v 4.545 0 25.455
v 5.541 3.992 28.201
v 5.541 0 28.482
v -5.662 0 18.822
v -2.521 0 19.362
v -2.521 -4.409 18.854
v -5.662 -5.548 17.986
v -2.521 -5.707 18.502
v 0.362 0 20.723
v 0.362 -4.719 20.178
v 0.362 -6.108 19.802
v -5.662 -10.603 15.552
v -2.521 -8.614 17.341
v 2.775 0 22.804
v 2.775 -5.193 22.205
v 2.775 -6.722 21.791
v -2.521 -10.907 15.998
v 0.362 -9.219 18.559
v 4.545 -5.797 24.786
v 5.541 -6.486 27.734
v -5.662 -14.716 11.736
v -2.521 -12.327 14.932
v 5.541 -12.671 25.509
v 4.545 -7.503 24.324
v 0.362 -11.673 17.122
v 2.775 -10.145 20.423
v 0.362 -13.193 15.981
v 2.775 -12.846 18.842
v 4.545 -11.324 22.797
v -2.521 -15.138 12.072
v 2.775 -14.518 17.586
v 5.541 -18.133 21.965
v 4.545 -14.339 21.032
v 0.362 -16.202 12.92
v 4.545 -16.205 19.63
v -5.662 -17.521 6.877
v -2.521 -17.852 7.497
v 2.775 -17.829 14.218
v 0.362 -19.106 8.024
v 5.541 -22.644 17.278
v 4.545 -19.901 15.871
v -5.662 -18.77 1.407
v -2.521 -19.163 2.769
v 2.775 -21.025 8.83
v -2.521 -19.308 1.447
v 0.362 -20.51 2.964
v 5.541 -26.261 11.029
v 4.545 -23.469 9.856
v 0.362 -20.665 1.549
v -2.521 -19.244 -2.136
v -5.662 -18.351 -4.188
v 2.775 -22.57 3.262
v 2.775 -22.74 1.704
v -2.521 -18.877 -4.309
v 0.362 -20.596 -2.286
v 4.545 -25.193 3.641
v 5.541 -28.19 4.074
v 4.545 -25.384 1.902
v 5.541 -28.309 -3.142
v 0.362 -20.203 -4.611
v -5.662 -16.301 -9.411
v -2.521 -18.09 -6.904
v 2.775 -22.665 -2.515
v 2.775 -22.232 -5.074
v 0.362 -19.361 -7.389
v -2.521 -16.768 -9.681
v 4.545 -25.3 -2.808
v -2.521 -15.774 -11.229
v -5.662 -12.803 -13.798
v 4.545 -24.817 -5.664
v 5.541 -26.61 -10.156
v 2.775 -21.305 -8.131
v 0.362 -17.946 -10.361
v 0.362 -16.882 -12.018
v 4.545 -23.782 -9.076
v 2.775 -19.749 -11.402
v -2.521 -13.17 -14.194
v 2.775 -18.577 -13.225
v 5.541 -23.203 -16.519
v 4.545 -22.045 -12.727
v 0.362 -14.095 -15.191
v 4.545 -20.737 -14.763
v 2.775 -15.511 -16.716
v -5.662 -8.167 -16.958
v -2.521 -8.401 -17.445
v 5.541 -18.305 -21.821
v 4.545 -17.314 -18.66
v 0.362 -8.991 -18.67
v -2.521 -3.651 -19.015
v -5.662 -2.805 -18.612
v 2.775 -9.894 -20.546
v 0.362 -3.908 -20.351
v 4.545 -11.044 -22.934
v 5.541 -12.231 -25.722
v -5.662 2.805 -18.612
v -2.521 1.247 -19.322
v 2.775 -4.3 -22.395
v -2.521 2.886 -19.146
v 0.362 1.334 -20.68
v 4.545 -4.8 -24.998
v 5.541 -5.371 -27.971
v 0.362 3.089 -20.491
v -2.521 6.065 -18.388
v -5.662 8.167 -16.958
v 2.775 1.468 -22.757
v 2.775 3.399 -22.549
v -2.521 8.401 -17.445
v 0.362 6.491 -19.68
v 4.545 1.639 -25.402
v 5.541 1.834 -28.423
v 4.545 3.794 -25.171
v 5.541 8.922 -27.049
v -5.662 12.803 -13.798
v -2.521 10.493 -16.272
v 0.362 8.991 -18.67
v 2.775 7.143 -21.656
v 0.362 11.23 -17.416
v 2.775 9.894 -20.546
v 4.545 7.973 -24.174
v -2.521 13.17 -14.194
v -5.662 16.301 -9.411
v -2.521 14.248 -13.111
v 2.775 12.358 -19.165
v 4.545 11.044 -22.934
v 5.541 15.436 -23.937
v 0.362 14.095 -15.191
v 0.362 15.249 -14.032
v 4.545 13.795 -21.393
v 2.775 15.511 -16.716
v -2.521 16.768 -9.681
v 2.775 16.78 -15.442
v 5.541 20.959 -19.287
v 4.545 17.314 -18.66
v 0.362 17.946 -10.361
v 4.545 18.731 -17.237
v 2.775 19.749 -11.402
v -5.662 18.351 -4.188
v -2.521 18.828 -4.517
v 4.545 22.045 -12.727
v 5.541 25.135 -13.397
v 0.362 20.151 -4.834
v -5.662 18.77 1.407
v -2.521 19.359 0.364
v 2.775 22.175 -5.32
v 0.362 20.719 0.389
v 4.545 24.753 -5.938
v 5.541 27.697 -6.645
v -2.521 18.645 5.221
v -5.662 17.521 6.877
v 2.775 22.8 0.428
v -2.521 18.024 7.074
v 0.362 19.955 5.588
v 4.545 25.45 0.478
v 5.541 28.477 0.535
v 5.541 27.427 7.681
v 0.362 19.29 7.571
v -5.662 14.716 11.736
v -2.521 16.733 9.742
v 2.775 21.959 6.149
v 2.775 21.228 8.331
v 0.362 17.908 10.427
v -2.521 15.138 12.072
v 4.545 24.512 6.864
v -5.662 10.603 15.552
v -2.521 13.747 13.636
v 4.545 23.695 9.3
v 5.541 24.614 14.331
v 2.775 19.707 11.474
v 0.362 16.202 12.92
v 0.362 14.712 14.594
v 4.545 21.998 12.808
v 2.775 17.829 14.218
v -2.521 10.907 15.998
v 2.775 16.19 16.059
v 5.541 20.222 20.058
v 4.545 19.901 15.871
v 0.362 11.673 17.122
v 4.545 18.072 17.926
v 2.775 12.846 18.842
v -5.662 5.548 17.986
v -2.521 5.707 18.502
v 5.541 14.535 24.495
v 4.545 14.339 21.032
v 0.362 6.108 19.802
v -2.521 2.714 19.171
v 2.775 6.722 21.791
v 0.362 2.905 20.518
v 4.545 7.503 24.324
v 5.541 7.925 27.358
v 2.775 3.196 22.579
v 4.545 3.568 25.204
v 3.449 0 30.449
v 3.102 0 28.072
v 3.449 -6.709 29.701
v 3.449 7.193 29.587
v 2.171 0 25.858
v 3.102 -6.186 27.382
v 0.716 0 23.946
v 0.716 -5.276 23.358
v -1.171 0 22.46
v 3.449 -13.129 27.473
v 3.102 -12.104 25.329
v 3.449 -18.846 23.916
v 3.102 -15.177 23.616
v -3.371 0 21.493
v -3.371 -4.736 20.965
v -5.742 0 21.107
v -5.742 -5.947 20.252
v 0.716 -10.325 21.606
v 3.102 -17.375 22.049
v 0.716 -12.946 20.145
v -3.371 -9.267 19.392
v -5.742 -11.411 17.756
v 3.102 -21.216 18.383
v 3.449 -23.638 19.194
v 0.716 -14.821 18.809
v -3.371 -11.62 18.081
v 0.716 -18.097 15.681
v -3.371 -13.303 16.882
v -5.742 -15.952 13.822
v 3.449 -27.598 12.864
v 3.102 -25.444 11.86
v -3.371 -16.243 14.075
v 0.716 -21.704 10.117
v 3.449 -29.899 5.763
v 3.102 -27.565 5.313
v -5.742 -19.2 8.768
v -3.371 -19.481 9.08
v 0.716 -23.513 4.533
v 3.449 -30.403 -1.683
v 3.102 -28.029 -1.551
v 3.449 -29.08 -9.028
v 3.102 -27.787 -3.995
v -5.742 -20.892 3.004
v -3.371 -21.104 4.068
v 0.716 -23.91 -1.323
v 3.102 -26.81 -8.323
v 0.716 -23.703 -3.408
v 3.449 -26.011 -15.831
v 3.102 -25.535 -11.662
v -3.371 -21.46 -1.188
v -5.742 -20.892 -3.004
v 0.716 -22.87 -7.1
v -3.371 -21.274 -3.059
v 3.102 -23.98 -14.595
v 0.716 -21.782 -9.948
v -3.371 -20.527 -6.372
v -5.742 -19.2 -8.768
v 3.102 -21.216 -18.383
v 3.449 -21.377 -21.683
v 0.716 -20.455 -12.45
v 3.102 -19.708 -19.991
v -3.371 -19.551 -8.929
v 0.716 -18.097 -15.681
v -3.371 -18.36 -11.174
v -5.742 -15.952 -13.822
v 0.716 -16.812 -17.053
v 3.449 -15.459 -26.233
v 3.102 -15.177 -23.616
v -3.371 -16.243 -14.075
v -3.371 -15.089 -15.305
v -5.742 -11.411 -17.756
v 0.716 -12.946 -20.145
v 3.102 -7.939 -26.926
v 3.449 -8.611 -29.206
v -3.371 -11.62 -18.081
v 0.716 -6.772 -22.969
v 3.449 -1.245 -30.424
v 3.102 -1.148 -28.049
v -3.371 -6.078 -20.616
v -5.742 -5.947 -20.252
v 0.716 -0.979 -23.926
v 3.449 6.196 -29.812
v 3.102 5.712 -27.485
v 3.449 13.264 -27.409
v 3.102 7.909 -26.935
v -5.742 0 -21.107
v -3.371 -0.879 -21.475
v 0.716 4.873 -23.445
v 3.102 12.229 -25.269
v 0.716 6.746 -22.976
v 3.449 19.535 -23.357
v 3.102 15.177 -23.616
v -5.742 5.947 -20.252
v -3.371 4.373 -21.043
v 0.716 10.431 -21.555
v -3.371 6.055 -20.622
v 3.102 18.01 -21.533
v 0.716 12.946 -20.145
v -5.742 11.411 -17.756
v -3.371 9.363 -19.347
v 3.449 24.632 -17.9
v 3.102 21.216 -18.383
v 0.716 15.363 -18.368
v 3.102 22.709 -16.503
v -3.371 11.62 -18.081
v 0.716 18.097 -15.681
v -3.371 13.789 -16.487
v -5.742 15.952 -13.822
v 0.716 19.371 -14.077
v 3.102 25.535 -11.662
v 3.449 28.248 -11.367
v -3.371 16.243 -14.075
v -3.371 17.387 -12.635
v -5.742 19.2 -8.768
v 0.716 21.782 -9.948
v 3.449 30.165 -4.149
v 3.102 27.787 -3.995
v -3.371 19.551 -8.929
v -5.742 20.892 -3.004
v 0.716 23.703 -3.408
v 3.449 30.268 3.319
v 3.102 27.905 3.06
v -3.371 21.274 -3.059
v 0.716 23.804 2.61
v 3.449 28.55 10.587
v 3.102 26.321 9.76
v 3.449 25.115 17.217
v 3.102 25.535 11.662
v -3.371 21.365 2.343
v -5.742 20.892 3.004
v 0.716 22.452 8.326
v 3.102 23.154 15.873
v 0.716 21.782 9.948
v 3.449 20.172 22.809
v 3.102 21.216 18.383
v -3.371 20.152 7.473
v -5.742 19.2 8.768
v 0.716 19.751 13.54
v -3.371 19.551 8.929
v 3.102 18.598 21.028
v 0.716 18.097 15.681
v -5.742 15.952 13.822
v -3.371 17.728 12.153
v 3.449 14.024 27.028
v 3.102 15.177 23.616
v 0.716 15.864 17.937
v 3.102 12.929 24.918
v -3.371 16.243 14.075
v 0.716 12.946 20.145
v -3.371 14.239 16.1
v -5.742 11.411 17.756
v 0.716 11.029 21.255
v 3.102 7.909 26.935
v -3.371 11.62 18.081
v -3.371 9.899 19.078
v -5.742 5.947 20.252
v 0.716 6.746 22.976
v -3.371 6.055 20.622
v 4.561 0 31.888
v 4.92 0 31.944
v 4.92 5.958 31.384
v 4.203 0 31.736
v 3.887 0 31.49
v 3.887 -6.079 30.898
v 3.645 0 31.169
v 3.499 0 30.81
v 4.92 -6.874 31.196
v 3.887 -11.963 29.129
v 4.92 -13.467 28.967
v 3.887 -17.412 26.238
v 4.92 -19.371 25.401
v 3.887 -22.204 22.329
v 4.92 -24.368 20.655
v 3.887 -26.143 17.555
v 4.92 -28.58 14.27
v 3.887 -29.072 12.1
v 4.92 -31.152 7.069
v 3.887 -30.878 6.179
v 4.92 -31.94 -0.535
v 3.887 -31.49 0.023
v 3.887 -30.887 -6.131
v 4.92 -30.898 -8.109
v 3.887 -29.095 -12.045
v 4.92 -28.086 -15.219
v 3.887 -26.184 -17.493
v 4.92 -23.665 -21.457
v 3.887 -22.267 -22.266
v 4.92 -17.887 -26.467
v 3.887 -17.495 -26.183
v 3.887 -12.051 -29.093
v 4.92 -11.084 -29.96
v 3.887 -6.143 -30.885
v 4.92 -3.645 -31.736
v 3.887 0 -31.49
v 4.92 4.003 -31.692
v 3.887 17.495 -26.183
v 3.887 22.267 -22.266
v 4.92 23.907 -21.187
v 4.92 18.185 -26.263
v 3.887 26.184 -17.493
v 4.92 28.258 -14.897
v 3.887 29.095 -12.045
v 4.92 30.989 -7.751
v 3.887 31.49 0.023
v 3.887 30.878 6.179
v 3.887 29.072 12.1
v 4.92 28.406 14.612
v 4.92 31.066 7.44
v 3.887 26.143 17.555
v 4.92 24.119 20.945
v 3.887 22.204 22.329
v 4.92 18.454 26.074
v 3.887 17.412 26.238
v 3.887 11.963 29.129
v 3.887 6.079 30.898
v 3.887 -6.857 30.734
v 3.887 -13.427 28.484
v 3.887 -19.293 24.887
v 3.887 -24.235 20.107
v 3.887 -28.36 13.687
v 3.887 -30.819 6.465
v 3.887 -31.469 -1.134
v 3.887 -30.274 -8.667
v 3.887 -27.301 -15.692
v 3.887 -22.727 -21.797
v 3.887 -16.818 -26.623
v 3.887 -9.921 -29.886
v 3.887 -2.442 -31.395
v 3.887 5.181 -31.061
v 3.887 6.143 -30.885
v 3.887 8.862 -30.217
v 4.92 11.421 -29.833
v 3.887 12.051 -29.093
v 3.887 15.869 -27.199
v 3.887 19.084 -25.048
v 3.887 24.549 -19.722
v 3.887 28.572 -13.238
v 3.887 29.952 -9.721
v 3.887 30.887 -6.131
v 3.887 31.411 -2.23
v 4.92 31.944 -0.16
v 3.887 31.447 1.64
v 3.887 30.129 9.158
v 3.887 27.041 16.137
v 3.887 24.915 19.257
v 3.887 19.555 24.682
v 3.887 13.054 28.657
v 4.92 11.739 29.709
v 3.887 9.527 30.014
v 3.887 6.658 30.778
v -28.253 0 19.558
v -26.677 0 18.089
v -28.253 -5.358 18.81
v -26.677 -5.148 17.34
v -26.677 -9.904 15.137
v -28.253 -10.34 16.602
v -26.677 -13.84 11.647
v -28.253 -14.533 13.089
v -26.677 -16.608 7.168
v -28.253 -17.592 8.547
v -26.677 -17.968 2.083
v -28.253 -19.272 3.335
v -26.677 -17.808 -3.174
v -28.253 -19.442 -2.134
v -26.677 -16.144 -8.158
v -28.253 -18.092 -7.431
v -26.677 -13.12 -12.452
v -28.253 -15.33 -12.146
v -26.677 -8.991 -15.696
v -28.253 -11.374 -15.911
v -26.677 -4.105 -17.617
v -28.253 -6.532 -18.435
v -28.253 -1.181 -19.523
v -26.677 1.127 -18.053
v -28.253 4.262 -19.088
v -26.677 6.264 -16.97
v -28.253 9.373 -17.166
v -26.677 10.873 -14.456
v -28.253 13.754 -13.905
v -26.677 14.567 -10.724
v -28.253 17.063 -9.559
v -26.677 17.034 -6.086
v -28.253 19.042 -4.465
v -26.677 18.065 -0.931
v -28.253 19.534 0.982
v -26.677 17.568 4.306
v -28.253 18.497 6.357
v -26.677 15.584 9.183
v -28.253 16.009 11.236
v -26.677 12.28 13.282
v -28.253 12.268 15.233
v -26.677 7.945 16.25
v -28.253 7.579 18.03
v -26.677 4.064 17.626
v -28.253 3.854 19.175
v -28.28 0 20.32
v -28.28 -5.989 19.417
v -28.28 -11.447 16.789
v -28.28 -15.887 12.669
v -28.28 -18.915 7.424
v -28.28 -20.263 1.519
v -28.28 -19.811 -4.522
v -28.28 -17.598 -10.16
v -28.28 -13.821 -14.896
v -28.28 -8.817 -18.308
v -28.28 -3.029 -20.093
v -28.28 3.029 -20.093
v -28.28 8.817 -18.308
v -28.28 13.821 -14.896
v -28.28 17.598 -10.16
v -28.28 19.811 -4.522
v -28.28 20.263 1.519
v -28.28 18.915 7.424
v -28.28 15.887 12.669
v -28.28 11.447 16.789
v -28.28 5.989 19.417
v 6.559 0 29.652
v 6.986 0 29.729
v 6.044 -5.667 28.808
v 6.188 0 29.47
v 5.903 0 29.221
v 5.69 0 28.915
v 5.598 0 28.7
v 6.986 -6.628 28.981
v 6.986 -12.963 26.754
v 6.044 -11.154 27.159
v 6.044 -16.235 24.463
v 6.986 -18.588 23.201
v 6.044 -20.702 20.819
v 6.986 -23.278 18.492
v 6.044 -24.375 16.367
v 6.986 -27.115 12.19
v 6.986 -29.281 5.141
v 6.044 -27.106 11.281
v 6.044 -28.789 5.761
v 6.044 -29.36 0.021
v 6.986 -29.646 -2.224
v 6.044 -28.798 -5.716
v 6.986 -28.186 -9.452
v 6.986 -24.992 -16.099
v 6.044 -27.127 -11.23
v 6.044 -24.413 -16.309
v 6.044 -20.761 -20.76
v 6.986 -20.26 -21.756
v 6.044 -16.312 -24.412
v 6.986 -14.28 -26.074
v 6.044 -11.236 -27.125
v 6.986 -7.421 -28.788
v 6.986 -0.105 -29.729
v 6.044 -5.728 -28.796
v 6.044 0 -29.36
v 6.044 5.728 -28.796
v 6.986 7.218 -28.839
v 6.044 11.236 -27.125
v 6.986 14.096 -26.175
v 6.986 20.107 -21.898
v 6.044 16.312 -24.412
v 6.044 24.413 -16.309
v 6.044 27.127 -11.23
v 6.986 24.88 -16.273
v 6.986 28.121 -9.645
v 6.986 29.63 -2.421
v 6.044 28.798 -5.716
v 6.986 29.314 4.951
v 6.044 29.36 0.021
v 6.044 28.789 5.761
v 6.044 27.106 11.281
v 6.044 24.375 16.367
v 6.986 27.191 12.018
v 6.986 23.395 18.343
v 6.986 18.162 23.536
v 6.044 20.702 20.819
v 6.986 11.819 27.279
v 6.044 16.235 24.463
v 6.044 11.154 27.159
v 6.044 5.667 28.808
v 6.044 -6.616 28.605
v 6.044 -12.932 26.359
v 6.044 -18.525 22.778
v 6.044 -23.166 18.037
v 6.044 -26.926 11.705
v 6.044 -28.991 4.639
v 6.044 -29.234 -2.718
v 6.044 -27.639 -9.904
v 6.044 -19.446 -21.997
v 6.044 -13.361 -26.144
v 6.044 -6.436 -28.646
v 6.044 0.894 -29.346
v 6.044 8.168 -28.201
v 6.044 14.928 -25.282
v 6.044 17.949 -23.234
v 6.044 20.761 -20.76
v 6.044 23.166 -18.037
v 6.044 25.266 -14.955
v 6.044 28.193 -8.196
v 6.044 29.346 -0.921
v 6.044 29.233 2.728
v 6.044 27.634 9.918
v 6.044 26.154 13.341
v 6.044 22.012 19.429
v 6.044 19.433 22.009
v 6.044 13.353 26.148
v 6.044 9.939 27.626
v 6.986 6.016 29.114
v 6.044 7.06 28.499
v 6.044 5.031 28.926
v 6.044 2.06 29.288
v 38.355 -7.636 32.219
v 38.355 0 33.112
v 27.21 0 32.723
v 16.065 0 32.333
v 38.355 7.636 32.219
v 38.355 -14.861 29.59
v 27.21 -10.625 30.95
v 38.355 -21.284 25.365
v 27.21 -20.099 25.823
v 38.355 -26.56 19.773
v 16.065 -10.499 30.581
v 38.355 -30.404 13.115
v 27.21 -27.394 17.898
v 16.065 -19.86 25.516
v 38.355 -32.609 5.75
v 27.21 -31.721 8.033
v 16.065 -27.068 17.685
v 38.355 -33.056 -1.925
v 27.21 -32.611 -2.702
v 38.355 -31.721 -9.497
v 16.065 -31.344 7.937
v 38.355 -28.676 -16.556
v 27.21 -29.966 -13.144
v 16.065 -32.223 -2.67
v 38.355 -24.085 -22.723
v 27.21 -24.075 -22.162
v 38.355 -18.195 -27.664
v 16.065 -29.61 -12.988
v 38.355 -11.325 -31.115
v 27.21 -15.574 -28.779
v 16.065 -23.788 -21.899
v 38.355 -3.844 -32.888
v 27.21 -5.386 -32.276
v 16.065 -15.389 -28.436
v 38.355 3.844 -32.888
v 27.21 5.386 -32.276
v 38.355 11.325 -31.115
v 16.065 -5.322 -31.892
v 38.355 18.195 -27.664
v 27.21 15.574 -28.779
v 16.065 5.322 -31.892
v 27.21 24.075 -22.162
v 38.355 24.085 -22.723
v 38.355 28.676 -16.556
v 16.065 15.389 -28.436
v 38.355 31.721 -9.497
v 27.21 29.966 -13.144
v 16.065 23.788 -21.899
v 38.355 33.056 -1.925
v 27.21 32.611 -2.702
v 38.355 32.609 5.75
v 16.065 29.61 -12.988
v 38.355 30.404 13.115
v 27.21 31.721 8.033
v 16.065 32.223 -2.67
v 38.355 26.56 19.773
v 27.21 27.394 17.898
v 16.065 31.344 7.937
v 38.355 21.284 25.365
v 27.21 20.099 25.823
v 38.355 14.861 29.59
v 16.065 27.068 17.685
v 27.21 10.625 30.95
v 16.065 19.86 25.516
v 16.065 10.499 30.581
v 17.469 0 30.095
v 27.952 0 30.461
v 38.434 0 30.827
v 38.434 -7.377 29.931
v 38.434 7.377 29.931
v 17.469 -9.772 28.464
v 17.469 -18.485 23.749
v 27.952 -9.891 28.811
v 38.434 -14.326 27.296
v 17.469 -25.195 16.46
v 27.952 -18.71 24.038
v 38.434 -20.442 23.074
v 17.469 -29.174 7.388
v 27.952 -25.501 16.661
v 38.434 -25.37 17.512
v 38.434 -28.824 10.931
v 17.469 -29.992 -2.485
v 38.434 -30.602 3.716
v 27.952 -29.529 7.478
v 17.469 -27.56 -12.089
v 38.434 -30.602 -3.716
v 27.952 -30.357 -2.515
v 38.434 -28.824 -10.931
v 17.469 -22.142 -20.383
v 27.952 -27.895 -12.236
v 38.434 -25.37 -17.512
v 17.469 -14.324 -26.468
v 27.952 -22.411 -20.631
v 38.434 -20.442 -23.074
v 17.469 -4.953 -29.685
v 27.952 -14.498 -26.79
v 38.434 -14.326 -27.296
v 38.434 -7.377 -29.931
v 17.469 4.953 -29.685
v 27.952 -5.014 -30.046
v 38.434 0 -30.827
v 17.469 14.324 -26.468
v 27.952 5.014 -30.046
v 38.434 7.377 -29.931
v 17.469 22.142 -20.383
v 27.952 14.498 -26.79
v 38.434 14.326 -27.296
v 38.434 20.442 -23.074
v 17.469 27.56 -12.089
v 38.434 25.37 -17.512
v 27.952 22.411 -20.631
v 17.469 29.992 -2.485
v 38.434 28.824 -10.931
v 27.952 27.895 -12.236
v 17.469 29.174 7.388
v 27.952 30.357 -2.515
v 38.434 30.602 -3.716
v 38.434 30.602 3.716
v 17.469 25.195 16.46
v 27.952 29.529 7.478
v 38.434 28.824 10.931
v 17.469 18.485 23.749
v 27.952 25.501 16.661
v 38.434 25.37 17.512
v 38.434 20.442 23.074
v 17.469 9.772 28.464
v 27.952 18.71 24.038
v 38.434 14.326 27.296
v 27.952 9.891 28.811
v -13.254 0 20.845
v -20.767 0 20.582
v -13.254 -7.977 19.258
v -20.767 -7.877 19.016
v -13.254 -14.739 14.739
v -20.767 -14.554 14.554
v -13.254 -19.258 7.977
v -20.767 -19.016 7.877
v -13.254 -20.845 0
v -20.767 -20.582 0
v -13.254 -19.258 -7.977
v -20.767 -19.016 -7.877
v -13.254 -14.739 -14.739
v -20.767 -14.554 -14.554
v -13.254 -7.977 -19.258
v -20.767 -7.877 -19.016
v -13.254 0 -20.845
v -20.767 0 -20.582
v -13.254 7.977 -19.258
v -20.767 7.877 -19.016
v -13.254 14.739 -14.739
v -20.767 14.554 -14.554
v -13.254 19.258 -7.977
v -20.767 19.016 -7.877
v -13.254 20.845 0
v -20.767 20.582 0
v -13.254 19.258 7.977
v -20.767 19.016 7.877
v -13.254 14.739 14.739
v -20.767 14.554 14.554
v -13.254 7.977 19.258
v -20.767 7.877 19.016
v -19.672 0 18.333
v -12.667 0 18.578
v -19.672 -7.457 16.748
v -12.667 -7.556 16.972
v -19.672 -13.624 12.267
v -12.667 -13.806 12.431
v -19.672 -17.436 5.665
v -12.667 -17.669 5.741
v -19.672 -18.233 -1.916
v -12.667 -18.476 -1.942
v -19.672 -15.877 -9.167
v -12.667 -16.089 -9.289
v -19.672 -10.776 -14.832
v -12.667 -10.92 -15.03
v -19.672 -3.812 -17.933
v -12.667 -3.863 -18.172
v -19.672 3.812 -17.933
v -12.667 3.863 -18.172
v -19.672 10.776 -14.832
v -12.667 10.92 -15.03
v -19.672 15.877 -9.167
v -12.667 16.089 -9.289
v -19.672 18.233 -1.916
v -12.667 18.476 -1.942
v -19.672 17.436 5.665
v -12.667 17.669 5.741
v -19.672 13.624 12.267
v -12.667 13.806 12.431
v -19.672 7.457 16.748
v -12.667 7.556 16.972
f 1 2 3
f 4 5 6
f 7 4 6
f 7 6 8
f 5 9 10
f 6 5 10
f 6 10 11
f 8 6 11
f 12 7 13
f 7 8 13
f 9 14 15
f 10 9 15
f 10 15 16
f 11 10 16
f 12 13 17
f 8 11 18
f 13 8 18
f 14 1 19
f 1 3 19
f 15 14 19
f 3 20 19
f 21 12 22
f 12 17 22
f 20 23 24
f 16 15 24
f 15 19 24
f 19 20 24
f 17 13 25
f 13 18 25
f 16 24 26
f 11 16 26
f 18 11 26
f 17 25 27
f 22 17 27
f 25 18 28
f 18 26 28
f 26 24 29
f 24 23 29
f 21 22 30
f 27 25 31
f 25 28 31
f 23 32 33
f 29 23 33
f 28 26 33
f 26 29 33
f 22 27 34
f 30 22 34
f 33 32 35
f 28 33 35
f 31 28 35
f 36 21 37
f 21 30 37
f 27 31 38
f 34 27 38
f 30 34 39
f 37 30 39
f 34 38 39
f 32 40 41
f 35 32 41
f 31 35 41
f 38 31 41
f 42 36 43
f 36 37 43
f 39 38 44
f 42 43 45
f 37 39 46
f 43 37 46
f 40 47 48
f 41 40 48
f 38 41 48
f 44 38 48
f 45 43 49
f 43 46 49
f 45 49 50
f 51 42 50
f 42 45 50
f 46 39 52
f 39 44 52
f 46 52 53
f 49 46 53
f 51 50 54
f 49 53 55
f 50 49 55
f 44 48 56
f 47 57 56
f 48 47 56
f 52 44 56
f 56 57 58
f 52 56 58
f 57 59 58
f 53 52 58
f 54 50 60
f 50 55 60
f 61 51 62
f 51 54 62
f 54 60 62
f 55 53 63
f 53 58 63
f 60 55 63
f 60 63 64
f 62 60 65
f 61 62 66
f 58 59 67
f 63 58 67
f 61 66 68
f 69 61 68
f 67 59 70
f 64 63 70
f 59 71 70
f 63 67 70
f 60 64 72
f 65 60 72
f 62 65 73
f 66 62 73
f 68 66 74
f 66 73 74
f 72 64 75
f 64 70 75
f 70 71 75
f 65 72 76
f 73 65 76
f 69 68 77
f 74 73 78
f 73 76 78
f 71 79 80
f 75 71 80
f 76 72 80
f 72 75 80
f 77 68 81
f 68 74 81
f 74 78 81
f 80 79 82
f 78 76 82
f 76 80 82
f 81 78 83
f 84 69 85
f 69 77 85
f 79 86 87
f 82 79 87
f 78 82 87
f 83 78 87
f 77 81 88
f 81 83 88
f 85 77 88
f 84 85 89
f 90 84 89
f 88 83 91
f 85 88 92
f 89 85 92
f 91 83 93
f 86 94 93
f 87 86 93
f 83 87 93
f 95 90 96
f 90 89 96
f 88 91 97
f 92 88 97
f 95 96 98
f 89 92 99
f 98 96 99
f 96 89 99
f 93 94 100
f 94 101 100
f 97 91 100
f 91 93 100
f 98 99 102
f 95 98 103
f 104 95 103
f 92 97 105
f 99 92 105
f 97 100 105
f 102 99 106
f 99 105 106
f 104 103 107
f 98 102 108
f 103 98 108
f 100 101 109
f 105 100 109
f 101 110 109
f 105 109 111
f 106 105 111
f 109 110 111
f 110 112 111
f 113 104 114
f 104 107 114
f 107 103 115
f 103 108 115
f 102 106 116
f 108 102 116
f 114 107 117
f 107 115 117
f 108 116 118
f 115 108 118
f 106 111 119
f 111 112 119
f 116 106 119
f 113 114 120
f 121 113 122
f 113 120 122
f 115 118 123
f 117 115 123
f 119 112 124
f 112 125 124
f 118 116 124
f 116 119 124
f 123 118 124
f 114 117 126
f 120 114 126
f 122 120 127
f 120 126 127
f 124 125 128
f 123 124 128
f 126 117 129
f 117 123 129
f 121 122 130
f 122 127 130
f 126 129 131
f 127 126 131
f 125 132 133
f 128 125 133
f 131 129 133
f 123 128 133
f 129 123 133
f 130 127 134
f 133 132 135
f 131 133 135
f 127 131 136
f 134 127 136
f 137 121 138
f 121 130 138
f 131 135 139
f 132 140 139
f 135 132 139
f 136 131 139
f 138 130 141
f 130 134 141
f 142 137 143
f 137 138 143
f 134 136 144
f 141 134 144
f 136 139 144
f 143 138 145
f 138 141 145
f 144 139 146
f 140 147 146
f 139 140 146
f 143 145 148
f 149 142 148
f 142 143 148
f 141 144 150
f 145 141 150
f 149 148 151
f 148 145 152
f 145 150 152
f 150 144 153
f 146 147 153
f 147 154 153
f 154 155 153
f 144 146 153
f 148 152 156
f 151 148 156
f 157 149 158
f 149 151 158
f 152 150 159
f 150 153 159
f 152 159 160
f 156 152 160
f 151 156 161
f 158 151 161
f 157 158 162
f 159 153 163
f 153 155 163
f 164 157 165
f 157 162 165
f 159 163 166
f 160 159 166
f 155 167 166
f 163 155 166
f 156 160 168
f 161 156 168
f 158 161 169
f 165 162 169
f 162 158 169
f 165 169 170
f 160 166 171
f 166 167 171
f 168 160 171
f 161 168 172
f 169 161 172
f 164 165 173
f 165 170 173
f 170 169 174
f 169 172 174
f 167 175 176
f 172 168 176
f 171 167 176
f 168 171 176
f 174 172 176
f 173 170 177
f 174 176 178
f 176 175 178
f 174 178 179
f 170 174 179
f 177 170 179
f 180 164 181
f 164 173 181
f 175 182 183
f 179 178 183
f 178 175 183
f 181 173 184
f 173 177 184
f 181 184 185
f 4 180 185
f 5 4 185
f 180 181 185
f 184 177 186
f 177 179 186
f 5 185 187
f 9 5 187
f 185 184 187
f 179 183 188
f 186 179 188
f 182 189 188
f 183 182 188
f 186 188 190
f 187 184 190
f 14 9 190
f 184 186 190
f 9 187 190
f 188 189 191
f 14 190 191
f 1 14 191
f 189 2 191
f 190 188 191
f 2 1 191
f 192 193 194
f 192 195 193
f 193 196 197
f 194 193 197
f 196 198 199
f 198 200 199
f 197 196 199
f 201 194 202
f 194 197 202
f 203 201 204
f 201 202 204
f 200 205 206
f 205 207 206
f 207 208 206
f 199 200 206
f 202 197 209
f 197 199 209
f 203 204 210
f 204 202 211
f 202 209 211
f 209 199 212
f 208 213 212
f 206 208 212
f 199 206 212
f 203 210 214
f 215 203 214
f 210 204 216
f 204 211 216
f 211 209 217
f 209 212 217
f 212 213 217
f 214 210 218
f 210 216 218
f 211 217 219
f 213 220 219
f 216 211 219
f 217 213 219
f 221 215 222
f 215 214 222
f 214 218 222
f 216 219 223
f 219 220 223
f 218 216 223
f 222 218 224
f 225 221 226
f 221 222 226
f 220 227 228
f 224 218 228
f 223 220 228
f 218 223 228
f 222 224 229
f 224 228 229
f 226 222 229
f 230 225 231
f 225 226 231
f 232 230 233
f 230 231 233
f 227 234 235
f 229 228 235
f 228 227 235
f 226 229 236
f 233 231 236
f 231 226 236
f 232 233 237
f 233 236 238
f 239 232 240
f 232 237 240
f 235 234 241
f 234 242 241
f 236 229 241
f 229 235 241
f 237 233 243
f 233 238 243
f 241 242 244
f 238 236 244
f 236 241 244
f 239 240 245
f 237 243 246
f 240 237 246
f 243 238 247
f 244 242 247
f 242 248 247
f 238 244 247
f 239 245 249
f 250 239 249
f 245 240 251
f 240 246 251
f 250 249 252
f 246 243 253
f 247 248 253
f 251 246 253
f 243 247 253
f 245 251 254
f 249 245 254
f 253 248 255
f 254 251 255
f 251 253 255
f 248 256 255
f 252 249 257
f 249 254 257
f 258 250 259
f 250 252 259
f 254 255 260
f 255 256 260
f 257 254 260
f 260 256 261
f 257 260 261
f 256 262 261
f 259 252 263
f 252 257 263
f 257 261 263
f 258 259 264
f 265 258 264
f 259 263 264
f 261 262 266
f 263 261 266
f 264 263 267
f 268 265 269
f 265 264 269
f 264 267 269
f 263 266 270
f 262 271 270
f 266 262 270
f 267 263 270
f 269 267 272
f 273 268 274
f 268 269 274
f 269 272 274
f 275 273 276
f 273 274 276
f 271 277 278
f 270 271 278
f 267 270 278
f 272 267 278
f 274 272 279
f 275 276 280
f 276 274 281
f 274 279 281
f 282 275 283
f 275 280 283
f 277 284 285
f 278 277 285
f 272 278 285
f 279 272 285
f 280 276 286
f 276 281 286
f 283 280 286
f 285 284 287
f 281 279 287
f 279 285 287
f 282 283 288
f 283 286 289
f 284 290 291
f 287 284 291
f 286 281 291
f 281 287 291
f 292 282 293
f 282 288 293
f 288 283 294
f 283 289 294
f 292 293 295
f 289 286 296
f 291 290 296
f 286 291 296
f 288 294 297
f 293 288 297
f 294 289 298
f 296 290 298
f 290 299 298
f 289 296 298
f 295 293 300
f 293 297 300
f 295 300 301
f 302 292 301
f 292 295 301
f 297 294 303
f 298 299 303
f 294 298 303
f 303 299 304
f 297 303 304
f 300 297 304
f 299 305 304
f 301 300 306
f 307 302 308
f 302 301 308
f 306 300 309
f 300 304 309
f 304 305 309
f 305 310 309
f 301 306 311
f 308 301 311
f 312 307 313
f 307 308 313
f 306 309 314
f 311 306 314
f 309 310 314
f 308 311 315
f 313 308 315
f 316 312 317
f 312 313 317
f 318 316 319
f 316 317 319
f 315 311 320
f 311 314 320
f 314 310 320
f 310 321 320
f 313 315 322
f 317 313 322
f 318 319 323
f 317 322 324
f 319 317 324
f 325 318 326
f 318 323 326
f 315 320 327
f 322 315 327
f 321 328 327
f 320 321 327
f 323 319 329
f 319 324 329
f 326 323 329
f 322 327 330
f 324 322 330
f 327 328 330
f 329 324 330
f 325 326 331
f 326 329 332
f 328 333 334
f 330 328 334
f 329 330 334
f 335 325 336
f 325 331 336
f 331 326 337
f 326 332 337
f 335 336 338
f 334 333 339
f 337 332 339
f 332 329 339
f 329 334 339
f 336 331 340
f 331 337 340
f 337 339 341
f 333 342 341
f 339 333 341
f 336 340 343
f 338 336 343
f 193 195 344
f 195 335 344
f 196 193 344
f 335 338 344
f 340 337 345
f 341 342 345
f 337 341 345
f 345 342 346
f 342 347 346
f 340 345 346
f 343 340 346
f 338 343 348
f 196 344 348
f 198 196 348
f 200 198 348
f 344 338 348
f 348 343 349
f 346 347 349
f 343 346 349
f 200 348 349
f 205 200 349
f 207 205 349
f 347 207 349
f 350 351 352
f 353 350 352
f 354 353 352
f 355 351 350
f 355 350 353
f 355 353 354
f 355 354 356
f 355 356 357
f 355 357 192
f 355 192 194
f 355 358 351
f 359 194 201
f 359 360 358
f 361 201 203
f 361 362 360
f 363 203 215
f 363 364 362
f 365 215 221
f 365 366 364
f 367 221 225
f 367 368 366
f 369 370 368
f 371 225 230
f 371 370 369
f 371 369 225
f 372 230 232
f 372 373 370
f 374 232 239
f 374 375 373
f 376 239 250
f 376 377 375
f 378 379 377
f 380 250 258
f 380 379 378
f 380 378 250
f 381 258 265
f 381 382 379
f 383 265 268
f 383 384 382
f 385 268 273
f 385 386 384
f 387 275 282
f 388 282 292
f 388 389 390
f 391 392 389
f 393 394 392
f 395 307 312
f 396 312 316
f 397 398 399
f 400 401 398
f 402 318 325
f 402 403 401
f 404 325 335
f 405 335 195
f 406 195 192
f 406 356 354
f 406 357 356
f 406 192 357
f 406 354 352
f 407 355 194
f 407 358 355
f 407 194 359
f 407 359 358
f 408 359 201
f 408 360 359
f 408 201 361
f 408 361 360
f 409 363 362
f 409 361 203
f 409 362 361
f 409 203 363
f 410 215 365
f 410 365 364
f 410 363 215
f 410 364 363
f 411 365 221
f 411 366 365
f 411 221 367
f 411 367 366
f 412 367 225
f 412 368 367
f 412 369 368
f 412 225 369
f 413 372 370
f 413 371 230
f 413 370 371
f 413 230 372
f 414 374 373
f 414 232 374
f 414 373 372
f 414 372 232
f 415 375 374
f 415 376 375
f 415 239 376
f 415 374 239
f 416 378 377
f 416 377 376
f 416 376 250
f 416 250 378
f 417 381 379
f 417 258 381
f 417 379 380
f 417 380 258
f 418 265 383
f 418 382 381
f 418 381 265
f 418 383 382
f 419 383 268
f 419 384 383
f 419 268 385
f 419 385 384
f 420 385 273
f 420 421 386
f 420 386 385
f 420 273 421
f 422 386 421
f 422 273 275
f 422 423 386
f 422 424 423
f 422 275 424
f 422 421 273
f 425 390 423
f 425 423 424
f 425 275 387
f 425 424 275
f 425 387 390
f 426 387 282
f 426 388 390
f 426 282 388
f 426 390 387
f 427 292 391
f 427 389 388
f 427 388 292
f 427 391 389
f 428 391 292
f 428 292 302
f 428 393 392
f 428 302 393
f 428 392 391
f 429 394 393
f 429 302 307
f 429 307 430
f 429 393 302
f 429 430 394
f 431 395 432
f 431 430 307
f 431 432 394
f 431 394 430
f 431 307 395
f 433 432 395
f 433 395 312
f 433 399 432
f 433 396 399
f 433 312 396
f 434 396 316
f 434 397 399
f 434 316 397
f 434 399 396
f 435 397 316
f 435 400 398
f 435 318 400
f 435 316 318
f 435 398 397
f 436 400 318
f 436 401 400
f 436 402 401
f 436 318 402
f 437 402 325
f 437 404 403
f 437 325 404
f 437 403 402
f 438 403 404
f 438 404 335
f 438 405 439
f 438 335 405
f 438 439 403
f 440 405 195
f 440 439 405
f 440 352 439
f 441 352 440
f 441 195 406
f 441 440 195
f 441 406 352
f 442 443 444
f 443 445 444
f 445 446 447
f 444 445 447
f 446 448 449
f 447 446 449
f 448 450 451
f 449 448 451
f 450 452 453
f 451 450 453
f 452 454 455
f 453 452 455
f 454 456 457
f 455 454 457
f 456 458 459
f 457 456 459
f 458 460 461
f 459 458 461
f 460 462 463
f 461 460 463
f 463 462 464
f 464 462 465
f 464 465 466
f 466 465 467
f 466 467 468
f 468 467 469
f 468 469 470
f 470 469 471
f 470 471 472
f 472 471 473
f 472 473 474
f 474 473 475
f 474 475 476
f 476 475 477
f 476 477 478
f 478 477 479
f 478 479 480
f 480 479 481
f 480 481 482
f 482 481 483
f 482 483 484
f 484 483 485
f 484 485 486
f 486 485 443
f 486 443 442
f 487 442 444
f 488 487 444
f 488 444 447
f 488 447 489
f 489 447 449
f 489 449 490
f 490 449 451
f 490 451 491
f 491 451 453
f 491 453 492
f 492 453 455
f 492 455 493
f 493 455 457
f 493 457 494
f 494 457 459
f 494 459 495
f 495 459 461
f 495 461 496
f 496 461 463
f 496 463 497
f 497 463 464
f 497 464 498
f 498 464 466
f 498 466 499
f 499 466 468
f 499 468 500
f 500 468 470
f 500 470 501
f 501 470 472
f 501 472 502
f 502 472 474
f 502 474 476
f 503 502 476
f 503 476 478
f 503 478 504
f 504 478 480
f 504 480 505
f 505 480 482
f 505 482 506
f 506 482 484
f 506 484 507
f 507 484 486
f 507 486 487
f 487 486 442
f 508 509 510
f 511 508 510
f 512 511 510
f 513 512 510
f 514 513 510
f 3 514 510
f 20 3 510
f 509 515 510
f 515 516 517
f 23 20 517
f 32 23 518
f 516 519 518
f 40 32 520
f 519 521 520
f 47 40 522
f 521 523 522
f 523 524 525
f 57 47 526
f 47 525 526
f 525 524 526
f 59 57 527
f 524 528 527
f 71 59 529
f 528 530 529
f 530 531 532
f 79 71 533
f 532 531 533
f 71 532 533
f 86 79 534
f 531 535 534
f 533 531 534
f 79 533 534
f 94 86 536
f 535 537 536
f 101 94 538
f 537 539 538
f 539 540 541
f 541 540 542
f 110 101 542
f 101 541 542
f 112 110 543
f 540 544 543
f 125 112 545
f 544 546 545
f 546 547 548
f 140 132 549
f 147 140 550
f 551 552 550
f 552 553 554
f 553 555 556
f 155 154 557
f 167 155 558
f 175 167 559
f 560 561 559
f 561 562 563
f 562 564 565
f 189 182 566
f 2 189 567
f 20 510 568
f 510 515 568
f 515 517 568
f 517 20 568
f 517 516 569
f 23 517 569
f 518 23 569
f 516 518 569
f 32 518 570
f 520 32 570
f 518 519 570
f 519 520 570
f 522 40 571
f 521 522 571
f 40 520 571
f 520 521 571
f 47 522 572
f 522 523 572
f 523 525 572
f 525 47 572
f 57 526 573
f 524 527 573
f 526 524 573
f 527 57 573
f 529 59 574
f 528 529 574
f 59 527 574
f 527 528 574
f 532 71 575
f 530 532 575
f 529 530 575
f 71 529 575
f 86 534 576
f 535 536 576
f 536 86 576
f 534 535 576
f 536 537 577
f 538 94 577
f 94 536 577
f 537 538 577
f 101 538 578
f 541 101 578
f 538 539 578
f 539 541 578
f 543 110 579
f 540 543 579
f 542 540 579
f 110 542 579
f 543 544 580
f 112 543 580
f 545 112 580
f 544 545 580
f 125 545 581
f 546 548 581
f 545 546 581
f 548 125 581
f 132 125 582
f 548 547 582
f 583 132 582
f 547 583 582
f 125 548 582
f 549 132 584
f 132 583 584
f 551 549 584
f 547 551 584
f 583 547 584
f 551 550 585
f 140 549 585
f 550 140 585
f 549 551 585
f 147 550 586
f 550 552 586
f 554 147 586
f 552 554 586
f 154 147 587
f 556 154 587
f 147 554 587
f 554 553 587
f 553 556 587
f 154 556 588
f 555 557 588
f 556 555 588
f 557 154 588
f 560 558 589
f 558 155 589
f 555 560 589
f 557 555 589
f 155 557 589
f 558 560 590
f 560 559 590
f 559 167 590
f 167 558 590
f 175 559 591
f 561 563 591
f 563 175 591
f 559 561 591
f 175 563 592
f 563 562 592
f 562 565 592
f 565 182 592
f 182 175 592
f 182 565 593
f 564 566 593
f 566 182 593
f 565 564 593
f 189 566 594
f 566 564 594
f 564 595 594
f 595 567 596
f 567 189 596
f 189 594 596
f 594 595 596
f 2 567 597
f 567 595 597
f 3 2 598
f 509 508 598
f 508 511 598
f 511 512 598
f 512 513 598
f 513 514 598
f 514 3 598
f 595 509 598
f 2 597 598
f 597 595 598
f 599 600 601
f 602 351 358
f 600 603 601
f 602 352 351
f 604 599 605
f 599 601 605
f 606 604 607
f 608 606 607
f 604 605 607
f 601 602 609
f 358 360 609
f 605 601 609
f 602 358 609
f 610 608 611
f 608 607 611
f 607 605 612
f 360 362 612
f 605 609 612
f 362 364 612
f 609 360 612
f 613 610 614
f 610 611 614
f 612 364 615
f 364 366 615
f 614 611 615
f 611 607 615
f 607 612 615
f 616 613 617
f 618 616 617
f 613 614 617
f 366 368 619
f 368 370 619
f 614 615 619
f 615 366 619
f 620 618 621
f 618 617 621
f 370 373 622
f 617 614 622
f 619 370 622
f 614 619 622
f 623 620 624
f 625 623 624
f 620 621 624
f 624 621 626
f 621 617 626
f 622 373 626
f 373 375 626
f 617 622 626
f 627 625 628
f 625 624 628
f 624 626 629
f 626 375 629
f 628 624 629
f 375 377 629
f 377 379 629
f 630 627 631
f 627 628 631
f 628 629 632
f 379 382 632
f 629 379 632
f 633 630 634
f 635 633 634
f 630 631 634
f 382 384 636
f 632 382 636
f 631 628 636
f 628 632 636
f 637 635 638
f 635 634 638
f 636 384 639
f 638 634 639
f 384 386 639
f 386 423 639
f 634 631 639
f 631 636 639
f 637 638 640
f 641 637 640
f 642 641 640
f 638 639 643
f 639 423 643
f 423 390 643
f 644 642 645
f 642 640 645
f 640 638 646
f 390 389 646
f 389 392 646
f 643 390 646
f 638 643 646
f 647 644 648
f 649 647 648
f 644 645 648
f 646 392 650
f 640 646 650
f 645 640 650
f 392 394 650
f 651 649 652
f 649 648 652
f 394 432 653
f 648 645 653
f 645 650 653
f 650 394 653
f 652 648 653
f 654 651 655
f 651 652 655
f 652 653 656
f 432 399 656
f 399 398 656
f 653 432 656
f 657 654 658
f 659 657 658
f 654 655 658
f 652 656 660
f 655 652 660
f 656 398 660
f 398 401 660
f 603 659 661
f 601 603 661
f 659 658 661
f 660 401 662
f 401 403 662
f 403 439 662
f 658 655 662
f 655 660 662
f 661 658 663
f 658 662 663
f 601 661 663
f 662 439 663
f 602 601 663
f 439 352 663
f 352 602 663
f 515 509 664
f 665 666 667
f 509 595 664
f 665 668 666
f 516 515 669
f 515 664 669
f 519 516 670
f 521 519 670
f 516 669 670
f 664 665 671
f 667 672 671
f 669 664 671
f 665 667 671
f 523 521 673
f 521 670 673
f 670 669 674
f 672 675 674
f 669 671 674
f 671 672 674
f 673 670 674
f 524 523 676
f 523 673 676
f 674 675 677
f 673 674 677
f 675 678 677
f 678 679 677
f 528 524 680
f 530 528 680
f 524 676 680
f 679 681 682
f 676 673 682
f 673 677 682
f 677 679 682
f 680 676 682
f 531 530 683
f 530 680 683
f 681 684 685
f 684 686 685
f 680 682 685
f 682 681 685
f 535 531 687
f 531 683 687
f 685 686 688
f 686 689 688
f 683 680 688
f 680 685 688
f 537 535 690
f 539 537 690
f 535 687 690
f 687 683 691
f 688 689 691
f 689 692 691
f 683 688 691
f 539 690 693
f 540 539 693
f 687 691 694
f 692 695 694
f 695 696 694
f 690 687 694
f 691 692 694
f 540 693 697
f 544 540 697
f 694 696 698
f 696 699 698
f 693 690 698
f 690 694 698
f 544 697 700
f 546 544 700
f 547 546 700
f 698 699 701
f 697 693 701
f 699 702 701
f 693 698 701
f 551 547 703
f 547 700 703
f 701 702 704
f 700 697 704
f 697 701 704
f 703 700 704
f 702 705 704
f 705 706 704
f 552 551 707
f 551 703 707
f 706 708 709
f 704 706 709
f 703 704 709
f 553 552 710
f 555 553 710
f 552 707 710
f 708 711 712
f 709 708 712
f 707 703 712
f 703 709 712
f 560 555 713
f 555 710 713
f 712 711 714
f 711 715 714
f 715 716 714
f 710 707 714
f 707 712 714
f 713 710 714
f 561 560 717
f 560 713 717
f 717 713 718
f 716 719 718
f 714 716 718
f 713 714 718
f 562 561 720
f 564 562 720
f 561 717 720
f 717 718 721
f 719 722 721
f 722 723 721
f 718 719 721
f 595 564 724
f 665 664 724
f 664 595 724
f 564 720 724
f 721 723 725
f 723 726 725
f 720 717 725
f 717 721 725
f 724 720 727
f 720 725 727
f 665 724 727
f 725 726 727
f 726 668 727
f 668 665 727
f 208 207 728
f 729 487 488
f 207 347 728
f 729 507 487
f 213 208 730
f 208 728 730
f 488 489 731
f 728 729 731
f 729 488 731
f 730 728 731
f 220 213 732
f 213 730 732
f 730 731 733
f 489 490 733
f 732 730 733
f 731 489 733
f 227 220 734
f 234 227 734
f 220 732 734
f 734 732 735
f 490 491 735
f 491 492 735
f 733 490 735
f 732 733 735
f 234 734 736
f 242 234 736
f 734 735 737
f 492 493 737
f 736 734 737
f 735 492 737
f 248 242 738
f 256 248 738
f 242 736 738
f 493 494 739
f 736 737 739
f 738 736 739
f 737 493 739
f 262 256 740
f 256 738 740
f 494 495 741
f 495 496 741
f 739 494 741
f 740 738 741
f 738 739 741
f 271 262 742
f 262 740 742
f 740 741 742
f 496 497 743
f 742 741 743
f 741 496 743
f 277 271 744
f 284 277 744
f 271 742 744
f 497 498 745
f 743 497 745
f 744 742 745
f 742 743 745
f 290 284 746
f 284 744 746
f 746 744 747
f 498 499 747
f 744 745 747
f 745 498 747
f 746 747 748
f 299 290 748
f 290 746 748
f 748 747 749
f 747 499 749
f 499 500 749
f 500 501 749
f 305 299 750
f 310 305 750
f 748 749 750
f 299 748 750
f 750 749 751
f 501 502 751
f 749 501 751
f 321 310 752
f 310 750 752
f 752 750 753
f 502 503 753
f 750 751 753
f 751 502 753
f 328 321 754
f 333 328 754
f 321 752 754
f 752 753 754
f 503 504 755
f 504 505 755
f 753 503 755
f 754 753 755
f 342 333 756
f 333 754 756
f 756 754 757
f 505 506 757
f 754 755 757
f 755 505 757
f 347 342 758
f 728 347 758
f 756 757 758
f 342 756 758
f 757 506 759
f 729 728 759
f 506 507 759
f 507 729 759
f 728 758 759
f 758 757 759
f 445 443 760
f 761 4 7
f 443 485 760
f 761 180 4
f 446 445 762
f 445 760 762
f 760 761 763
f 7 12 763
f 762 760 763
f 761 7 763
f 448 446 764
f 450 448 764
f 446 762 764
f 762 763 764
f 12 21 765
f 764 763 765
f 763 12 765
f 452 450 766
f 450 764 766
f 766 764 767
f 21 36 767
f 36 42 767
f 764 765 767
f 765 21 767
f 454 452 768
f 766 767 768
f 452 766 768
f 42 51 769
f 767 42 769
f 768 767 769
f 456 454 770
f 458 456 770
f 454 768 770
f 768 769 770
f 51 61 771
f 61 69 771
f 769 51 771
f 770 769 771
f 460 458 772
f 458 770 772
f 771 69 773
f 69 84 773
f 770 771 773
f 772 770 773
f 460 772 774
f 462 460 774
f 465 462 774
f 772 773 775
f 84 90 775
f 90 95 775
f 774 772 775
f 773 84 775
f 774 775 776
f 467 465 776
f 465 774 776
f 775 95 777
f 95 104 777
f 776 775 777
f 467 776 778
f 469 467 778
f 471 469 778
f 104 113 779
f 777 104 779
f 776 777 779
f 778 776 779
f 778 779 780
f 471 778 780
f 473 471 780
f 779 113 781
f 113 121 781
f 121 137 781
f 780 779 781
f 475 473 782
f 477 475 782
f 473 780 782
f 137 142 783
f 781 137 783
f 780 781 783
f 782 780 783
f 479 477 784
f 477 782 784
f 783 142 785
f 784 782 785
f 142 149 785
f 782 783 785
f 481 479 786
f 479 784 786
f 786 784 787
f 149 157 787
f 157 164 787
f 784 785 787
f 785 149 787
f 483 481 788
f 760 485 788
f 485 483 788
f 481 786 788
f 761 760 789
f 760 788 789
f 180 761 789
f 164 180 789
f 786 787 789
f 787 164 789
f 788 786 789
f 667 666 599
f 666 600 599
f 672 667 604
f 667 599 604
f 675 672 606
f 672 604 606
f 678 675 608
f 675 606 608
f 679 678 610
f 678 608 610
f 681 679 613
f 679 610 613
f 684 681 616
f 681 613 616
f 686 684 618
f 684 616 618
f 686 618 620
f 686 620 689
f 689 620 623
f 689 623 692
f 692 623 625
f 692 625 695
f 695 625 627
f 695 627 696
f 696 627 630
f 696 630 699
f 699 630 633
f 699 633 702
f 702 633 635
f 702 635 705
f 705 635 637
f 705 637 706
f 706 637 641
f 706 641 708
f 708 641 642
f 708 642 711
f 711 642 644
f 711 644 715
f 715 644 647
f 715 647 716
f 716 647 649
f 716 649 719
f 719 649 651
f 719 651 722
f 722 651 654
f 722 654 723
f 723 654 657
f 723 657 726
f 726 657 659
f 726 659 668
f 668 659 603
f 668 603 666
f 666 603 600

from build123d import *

# Parameters (mm, degrees)
F2_R    = 1.524
F3_R    = 1.524
F4_SIZE = 1.524


with BuildPart() as f1:
    # F0 (on Front) → F1 (revolve)
    with BuildSketch(Plane.XZ):
        with BuildLine():
            Line((-5.741719, 21.107047), (-28.279795, 20.32))
            Line((-28.279795, 20.32), (-28.200015, 18.035393))
            Line((-28.200015, 18.035393), (-5.661939, 18.82244))
            ThreePointArc((-5.661939, 18.82244), (2.087676, 22.089), (5.699217, 29.68398))
            Line((5.699217, 29.68398), (38.434368, 30.827117))
            Line((38.434368, 30.827117), (38.354588, 33.111724))
            Line((38.354588, 33.111724), (3.450864, 31.892859))
            Line((3.450864, 31.892859), (3.450864, 30.626245))
            ThreePointArc((3.450864, 30.626245), (0.777575, 24.009624), (-5.741719, 21.107047))
        make_face()
    revolve(axis=Axis((3.331136, 0, 0), (1, 0, 0)))

    # F2
    f2_edges = [f1.edges().sort_by_distance(p)[0] for p in [
        (3.450864, 0, -31.892859),
    ]]
    fillet(f2_edges, radius=F2_R)

    # F3
    f3_edges = [f1.edges().sort_by_distance(p)[0] for p in [
        (5.699217, 0, -29.68398),
    ]]
    fillet(f3_edges, radius=F3_R)

    # F4
    f4_edges = [f1.edges().sort_by_distance(p)[0] for p in [
        (-28.200015, 0, -18.035393),
    ]]
    chamfer(f4_edges, length=F4_SIZE)


solid = f1.part
